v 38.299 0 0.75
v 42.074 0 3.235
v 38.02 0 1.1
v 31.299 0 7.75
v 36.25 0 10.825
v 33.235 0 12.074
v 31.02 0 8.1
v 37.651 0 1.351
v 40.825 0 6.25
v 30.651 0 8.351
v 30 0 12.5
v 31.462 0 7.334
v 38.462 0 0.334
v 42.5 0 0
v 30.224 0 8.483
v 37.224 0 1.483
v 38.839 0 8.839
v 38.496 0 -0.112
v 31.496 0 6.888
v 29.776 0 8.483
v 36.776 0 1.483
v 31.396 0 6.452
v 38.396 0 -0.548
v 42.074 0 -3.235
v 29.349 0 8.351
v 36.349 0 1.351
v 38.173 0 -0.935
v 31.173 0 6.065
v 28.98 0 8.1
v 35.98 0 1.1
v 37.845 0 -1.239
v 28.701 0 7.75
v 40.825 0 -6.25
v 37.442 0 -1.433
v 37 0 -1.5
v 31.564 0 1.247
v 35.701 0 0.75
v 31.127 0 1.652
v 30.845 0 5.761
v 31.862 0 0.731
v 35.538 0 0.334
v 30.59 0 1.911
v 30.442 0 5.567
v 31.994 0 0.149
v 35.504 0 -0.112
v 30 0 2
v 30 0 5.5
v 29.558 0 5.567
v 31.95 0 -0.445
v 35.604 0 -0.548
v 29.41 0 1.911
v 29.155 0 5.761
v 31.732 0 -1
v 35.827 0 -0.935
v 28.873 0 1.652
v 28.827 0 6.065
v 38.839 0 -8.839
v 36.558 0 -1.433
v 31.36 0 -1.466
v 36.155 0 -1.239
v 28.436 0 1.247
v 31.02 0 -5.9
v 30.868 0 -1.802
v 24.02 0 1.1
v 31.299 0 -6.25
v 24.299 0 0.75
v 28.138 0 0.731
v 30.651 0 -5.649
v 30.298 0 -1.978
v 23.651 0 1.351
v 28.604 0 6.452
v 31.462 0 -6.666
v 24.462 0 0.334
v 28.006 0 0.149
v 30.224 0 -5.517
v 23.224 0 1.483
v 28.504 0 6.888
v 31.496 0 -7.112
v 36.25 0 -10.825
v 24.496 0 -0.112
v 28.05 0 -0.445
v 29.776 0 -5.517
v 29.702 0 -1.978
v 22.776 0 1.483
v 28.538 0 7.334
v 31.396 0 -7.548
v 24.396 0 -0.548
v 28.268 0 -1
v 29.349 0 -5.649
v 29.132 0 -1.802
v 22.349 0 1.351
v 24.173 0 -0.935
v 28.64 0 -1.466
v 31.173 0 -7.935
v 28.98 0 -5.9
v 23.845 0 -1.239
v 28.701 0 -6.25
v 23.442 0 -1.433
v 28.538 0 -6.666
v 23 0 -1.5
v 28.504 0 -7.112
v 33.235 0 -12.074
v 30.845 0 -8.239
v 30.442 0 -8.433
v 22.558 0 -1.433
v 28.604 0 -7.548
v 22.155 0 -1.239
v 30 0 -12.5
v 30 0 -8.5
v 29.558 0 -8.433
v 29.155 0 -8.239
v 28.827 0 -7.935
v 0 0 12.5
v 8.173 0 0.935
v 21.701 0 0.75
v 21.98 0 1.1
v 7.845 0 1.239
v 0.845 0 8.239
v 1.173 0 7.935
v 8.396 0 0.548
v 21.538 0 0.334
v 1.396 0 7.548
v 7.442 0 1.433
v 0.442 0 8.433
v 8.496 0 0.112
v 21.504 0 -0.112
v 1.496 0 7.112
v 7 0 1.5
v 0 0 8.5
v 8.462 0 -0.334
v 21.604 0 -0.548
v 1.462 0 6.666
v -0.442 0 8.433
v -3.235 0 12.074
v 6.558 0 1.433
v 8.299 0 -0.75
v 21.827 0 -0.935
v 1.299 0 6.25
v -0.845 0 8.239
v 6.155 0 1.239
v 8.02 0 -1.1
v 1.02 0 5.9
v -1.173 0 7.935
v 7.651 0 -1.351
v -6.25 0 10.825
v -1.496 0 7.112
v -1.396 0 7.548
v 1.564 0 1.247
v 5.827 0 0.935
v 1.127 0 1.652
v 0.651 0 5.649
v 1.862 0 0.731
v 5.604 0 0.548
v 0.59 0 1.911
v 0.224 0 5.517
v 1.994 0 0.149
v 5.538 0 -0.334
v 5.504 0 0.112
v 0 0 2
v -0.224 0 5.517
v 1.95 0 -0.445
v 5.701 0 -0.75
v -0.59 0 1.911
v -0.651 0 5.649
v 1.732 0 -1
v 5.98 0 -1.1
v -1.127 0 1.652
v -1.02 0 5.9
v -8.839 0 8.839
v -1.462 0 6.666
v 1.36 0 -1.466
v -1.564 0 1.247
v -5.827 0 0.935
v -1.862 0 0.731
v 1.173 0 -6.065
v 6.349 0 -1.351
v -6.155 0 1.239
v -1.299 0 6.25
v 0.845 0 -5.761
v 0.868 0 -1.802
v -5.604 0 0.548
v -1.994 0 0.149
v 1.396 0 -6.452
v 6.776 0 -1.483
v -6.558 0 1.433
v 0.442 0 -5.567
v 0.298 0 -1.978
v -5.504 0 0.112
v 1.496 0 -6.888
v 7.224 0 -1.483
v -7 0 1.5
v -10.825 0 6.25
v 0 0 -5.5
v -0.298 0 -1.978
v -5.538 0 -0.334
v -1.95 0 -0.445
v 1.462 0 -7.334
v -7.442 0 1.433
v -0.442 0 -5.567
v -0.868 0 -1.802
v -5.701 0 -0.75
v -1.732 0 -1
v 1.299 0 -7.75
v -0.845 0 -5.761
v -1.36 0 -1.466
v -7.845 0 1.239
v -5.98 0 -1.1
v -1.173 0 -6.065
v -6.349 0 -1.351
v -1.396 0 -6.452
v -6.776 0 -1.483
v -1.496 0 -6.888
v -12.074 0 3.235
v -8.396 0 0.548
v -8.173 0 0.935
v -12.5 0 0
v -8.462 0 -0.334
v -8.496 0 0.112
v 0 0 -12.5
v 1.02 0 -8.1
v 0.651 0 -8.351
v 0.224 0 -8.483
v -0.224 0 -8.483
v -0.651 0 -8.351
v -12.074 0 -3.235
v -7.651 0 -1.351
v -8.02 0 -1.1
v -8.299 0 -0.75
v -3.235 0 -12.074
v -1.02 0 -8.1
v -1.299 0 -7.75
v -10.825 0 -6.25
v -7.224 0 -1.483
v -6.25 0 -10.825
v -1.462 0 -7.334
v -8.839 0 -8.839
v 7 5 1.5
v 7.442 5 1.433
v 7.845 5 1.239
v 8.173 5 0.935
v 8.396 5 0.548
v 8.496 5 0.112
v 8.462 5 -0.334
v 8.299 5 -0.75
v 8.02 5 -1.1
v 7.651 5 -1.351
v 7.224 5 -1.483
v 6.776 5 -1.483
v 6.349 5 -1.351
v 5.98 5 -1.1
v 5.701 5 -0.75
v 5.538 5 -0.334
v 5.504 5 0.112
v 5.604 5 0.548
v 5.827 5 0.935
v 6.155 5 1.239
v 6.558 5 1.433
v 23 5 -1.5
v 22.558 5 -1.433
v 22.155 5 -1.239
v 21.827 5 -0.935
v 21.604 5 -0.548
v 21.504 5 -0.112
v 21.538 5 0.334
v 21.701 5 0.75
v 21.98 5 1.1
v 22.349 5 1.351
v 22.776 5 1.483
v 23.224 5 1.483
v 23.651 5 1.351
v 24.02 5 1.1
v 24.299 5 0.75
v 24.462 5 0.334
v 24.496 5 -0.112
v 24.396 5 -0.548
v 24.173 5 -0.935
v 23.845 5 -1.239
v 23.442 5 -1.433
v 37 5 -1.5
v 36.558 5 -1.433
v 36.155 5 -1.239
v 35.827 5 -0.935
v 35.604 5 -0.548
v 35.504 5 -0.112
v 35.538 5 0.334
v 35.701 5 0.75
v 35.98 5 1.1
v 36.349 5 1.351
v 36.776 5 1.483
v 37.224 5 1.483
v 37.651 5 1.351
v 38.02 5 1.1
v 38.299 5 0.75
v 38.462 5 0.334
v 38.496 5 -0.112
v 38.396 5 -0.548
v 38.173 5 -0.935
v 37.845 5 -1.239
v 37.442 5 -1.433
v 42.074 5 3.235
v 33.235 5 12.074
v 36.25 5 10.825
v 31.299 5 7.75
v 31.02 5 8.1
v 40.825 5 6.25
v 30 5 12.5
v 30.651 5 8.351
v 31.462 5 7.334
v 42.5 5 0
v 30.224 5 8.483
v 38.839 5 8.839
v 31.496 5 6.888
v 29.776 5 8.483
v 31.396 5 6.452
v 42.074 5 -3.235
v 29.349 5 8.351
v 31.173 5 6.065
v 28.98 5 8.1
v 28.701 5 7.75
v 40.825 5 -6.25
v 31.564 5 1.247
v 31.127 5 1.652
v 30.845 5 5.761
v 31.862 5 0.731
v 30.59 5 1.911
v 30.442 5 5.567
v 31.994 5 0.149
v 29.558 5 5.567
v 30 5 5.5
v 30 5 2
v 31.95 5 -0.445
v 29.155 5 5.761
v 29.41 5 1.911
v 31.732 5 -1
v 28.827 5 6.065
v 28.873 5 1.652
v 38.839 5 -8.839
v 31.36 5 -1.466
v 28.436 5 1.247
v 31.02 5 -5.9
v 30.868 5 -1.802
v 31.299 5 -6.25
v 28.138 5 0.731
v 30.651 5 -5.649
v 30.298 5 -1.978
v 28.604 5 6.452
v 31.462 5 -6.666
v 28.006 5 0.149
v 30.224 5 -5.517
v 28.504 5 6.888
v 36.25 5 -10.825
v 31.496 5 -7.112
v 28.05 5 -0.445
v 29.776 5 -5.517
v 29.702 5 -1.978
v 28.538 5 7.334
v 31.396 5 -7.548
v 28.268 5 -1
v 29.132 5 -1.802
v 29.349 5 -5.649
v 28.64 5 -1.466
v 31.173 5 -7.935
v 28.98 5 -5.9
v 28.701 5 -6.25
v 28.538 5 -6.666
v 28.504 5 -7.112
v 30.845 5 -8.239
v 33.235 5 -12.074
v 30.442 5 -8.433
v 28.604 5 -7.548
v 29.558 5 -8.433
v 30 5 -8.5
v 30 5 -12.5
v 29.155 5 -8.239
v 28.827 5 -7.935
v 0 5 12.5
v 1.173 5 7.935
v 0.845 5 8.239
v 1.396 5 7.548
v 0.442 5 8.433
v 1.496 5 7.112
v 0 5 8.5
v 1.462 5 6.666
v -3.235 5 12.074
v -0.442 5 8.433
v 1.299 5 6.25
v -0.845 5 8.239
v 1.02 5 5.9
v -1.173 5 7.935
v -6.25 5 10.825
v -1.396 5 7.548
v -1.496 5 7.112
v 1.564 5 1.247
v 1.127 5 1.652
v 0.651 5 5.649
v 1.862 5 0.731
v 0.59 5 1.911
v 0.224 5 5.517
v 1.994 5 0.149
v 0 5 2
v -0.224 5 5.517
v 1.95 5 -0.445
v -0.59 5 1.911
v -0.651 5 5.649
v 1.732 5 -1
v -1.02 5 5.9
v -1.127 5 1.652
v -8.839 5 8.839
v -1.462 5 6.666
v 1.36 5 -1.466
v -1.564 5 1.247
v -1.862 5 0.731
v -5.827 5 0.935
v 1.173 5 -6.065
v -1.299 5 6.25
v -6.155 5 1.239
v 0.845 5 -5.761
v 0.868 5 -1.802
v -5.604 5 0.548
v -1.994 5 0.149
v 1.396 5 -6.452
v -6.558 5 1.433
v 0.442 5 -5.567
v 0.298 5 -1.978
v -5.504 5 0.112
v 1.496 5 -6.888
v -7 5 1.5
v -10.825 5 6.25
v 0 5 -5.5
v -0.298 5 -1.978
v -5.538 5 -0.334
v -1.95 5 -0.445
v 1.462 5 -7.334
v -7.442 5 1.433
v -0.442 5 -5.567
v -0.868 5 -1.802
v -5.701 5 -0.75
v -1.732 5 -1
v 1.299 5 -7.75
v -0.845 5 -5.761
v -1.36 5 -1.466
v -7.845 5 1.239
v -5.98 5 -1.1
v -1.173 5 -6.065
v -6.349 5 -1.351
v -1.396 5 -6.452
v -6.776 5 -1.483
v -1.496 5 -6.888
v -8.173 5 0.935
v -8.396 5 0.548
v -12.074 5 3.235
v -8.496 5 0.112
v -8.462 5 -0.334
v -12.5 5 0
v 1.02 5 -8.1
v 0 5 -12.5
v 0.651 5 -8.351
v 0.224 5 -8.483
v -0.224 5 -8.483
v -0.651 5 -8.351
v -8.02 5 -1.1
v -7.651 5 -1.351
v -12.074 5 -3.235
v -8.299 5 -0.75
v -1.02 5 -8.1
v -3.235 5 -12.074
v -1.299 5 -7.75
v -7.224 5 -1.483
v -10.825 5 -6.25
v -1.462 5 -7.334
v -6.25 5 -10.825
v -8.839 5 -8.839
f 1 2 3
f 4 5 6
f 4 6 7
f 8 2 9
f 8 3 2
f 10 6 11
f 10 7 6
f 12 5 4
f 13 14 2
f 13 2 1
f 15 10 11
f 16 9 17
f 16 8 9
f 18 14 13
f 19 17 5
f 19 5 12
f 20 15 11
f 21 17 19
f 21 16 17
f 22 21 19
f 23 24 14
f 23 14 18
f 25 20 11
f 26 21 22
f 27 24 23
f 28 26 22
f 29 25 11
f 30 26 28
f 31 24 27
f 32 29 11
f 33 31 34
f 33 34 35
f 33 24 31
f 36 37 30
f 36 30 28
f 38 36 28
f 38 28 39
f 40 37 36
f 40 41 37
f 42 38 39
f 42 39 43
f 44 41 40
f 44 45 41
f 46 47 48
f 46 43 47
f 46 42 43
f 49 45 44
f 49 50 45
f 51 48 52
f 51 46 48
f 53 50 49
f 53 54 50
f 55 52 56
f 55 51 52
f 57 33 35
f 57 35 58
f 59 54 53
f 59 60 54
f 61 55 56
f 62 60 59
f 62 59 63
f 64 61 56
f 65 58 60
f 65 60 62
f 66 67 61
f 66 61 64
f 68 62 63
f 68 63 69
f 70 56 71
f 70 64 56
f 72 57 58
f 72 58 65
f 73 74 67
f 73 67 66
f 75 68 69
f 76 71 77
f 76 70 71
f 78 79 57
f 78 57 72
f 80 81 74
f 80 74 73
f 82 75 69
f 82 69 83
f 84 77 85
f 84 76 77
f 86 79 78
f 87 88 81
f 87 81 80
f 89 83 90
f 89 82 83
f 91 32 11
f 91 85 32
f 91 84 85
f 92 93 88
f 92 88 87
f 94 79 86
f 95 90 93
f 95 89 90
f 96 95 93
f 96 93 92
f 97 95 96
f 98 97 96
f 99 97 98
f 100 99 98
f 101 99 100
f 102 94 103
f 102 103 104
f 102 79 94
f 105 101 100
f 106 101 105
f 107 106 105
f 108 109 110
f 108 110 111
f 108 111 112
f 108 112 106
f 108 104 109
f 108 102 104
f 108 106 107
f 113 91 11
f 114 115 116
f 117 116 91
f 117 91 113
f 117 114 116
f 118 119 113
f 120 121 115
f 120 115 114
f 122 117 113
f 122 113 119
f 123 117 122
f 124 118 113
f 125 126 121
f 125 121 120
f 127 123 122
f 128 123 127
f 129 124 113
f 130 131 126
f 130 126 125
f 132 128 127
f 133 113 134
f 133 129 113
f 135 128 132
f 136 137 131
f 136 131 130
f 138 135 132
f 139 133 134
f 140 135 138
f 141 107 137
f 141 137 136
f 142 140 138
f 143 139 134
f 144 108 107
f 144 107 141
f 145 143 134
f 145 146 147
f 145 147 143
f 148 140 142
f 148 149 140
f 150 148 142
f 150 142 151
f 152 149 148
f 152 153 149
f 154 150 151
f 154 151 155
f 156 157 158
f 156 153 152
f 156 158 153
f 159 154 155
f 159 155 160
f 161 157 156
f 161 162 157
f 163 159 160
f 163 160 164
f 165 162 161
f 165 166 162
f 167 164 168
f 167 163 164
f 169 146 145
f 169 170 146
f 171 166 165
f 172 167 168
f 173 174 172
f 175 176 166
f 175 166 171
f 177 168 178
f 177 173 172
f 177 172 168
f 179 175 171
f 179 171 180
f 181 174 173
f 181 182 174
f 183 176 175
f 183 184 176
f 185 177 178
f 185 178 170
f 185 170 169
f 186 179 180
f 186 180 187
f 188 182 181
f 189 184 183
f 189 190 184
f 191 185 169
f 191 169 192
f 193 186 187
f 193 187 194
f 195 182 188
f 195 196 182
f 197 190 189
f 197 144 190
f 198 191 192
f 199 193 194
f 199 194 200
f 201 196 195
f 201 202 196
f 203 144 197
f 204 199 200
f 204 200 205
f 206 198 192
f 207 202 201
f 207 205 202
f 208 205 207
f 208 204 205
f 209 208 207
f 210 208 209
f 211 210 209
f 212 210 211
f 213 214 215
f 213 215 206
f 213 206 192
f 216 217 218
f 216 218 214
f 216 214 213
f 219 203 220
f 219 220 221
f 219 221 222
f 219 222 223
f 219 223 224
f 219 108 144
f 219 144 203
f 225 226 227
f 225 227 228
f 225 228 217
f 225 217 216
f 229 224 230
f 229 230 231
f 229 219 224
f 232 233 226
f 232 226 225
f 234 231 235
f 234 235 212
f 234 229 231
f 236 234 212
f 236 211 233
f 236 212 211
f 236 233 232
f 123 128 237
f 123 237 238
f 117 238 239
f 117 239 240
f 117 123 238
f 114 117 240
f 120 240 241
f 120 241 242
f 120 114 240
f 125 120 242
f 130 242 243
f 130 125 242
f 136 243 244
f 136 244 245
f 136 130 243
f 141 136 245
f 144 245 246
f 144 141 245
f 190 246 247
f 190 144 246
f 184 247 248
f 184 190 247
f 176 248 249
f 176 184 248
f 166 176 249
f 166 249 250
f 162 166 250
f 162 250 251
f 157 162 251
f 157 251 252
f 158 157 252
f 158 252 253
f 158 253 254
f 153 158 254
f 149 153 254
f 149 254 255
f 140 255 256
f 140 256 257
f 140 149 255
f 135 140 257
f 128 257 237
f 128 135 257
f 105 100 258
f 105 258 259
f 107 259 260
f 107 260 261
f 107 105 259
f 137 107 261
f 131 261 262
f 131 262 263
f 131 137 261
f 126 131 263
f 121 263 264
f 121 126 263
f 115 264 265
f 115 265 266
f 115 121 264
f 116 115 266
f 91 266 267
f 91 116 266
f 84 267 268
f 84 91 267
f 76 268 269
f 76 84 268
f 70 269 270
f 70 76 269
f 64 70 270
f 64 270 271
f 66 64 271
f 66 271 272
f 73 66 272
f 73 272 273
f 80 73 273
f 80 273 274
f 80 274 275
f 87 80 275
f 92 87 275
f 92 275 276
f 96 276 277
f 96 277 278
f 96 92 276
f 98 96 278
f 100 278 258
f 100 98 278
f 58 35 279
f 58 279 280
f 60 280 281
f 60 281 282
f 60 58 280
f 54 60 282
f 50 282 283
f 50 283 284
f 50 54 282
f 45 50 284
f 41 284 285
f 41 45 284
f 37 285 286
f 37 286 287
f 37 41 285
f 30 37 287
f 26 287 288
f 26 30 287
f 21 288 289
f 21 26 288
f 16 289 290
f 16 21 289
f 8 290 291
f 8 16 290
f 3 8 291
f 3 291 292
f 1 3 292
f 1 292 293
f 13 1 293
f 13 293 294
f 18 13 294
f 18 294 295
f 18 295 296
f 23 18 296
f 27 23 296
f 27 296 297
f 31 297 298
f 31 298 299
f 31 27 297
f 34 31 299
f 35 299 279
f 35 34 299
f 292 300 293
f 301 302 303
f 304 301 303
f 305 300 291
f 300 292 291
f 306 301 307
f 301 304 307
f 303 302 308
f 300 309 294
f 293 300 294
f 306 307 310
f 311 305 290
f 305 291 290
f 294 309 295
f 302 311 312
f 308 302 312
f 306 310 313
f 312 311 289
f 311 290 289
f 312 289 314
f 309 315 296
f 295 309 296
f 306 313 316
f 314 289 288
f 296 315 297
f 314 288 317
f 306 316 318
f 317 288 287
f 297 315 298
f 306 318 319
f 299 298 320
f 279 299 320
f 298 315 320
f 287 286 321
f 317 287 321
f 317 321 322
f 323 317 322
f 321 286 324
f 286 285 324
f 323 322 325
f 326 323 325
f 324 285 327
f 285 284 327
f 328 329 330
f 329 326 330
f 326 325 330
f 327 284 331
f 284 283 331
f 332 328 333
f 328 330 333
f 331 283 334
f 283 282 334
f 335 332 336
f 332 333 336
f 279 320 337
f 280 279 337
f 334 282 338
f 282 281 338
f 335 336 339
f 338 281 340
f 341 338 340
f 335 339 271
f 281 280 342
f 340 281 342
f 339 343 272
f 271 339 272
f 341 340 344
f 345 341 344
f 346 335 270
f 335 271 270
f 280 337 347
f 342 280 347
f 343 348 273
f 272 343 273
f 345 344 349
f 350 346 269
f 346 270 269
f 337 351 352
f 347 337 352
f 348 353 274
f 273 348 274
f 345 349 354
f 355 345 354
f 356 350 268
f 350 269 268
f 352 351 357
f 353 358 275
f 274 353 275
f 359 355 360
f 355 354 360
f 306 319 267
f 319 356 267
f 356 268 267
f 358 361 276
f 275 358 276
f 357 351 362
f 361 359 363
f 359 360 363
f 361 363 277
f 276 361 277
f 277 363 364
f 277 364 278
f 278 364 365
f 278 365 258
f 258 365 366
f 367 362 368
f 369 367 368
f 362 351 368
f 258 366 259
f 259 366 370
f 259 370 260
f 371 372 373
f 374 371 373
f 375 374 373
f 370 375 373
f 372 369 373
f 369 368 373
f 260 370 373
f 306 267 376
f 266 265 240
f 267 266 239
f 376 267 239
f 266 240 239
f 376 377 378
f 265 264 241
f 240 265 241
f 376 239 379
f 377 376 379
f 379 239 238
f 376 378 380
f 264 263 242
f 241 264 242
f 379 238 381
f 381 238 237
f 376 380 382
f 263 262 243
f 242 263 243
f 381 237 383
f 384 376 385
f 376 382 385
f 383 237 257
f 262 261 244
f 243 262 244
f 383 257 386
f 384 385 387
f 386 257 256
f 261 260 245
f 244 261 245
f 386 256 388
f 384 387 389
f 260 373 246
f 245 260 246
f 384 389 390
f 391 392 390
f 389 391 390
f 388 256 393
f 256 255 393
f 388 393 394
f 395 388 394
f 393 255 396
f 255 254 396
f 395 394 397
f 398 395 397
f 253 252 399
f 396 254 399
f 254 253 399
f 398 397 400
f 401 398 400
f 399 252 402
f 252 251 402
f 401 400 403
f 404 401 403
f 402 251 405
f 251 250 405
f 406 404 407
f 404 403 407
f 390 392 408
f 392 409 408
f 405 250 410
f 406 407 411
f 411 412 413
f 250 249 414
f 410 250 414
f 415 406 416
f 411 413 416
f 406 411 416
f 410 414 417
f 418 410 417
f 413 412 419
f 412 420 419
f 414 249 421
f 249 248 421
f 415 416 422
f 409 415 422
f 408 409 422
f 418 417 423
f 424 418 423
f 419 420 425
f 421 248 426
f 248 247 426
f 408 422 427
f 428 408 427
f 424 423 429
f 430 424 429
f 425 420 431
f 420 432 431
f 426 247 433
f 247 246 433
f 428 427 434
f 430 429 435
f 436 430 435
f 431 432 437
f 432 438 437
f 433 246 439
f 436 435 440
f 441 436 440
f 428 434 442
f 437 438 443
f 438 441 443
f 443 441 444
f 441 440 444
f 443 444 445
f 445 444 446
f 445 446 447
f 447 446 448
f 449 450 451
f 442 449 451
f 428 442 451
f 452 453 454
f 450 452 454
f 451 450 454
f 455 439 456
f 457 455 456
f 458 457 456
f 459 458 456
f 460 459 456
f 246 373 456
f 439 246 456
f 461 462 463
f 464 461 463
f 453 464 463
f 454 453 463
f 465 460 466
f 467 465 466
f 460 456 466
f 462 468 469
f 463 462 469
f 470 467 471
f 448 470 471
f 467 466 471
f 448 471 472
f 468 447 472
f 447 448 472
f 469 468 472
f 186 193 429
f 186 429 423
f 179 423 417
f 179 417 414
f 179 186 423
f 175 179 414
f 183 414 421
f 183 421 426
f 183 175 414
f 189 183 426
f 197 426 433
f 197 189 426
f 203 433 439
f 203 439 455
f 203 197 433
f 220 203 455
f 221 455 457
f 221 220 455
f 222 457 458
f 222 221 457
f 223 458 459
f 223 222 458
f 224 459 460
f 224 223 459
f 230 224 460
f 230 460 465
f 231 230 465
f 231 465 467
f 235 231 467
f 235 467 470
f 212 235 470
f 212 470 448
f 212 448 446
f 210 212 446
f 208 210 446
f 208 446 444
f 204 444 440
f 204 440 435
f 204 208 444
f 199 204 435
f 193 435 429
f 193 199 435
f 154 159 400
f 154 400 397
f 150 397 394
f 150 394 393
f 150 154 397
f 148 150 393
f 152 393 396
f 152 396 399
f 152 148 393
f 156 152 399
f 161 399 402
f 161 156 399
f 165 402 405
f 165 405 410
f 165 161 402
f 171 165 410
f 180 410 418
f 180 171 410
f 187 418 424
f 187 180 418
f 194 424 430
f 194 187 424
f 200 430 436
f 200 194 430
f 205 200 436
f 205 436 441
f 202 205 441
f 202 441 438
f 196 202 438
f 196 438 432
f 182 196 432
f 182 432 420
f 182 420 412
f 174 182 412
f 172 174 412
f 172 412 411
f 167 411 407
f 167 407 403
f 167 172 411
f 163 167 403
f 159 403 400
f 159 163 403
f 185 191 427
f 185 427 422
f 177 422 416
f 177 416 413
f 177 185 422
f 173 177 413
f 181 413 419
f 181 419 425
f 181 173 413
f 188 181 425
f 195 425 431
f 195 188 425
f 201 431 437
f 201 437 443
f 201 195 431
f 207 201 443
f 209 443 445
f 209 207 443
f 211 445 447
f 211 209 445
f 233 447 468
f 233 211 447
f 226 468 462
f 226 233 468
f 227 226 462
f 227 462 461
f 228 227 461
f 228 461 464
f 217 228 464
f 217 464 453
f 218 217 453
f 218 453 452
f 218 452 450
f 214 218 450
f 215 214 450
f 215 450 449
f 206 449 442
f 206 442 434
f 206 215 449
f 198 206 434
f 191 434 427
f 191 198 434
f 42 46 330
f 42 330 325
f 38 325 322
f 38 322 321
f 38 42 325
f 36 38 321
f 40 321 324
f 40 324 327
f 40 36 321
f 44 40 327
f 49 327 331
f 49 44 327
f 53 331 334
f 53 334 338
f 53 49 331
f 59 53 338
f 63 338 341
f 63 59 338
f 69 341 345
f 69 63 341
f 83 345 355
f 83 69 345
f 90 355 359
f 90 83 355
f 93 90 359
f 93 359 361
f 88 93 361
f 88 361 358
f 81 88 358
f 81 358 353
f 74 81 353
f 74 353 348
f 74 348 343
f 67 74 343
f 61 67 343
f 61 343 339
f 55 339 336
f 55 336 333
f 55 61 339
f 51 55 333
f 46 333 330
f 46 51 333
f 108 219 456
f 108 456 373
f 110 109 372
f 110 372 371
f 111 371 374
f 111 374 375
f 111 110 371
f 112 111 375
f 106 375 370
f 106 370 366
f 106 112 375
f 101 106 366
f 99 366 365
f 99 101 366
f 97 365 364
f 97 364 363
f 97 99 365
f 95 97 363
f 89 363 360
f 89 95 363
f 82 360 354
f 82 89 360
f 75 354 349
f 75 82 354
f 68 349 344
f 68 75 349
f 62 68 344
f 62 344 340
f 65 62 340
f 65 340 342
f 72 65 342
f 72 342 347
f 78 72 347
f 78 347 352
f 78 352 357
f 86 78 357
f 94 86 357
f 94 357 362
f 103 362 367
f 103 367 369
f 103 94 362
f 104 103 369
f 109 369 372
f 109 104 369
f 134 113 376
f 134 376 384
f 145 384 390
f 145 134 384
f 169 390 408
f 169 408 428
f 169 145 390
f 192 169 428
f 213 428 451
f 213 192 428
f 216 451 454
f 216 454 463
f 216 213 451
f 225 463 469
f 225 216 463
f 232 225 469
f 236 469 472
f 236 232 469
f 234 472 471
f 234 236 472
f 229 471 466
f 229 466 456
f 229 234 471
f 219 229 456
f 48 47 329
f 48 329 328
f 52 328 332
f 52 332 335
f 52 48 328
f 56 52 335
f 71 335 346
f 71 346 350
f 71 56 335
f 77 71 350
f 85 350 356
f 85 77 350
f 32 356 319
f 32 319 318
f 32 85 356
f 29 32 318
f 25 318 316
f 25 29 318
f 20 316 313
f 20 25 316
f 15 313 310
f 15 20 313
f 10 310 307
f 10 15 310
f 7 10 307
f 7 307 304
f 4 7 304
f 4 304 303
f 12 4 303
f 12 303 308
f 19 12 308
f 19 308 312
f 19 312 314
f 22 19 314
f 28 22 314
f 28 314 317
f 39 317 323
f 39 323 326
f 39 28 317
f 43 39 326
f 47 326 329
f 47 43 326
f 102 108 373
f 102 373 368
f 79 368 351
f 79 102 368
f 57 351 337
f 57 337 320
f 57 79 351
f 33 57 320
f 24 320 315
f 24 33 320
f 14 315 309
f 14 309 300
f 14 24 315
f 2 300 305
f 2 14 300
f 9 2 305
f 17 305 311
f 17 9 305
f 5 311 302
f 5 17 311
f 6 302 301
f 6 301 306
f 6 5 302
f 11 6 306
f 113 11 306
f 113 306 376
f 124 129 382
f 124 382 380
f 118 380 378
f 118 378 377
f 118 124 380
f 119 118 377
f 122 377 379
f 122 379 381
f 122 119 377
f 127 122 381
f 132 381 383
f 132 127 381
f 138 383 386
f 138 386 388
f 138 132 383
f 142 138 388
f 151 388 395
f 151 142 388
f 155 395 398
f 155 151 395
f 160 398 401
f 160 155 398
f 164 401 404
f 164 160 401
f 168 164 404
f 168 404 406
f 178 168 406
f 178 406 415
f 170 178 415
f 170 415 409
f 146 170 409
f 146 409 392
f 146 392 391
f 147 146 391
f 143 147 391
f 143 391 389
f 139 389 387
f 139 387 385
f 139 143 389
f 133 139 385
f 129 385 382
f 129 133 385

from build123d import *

# Parameters (mm, degrees)
SKETCH_1_R      = 2
SKETCH_1_R_2    = 1.5
EXTRUDE_1_DEPTH = 5


with BuildPart() as part:
    # 草图1 → 凸台-拉伸1 (new body)
    with BuildSketch(Plane(origin=(0, 0, 0), x_dir=(1, 0, 0), z_dir=(0, 1, 0))):
        with BuildLine():
            Line((0, 12.5), (30, 12.5))
            ThreePointArc((30, 12.5), (42.5, 0), (30, -12.5))
            Line((30, -12.5), (0, -12.5))
            ThreePointArc((0, -12.5), (-12.5, 0), (0, 12.5))
        make_face()
        with Locations(Location((30, 0, 0), (0, 0, 270))):
            Circle(SKETCH_1_R, mode=Mode.SUBTRACT)
        with Locations(Location((0, 0, 0), (0, 0, 270))):
            Circle(SKETCH_1_R, mode=Mode.SUBTRACT)
        with Locations(Location((7, 0, 0), (0, 0, 270))):
            Circle(SKETCH_1_R_2, mode=Mode.SUBTRACT)
        with Locations(Location((0, 7, 0), (0, 0, 270))):
            Circle(SKETCH_1_R_2, mode=Mode.SUBTRACT)
        with Locations(Location((-7, 0, 0), (0, 0, 270))):
            Circle(SKETCH_1_R_2, mode=Mode.SUBTRACT)
        with Locations(Location((0, -7, 0), (0, 0, 270))):
            Circle(SKETCH_1_R_2, mode=Mode.SUBTRACT)
        with Locations(Location((23, 0, 0), (0, 0, 90))):
            Circle(SKETCH_1_R_2, mode=Mode.SUBTRACT)
        with Locations(Location((30, -7, 0), (0, 0, 90))):
            Circle(SKETCH_1_R_2, mode=Mode.SUBTRACT)
        with Locations(Location((37, 0, 0), (0, 0, 90))):
            Circle(SKETCH_1_R_2, mode=Mode.SUBTRACT)
        with Locations(Location((30, 7, 0), (0, 0, 90))):
            Circle(SKETCH_1_R_2, mode=Mode.SUBTRACT)
    extrude(amount=EXTRUDE_1_DEPTH)


solid = part.part
